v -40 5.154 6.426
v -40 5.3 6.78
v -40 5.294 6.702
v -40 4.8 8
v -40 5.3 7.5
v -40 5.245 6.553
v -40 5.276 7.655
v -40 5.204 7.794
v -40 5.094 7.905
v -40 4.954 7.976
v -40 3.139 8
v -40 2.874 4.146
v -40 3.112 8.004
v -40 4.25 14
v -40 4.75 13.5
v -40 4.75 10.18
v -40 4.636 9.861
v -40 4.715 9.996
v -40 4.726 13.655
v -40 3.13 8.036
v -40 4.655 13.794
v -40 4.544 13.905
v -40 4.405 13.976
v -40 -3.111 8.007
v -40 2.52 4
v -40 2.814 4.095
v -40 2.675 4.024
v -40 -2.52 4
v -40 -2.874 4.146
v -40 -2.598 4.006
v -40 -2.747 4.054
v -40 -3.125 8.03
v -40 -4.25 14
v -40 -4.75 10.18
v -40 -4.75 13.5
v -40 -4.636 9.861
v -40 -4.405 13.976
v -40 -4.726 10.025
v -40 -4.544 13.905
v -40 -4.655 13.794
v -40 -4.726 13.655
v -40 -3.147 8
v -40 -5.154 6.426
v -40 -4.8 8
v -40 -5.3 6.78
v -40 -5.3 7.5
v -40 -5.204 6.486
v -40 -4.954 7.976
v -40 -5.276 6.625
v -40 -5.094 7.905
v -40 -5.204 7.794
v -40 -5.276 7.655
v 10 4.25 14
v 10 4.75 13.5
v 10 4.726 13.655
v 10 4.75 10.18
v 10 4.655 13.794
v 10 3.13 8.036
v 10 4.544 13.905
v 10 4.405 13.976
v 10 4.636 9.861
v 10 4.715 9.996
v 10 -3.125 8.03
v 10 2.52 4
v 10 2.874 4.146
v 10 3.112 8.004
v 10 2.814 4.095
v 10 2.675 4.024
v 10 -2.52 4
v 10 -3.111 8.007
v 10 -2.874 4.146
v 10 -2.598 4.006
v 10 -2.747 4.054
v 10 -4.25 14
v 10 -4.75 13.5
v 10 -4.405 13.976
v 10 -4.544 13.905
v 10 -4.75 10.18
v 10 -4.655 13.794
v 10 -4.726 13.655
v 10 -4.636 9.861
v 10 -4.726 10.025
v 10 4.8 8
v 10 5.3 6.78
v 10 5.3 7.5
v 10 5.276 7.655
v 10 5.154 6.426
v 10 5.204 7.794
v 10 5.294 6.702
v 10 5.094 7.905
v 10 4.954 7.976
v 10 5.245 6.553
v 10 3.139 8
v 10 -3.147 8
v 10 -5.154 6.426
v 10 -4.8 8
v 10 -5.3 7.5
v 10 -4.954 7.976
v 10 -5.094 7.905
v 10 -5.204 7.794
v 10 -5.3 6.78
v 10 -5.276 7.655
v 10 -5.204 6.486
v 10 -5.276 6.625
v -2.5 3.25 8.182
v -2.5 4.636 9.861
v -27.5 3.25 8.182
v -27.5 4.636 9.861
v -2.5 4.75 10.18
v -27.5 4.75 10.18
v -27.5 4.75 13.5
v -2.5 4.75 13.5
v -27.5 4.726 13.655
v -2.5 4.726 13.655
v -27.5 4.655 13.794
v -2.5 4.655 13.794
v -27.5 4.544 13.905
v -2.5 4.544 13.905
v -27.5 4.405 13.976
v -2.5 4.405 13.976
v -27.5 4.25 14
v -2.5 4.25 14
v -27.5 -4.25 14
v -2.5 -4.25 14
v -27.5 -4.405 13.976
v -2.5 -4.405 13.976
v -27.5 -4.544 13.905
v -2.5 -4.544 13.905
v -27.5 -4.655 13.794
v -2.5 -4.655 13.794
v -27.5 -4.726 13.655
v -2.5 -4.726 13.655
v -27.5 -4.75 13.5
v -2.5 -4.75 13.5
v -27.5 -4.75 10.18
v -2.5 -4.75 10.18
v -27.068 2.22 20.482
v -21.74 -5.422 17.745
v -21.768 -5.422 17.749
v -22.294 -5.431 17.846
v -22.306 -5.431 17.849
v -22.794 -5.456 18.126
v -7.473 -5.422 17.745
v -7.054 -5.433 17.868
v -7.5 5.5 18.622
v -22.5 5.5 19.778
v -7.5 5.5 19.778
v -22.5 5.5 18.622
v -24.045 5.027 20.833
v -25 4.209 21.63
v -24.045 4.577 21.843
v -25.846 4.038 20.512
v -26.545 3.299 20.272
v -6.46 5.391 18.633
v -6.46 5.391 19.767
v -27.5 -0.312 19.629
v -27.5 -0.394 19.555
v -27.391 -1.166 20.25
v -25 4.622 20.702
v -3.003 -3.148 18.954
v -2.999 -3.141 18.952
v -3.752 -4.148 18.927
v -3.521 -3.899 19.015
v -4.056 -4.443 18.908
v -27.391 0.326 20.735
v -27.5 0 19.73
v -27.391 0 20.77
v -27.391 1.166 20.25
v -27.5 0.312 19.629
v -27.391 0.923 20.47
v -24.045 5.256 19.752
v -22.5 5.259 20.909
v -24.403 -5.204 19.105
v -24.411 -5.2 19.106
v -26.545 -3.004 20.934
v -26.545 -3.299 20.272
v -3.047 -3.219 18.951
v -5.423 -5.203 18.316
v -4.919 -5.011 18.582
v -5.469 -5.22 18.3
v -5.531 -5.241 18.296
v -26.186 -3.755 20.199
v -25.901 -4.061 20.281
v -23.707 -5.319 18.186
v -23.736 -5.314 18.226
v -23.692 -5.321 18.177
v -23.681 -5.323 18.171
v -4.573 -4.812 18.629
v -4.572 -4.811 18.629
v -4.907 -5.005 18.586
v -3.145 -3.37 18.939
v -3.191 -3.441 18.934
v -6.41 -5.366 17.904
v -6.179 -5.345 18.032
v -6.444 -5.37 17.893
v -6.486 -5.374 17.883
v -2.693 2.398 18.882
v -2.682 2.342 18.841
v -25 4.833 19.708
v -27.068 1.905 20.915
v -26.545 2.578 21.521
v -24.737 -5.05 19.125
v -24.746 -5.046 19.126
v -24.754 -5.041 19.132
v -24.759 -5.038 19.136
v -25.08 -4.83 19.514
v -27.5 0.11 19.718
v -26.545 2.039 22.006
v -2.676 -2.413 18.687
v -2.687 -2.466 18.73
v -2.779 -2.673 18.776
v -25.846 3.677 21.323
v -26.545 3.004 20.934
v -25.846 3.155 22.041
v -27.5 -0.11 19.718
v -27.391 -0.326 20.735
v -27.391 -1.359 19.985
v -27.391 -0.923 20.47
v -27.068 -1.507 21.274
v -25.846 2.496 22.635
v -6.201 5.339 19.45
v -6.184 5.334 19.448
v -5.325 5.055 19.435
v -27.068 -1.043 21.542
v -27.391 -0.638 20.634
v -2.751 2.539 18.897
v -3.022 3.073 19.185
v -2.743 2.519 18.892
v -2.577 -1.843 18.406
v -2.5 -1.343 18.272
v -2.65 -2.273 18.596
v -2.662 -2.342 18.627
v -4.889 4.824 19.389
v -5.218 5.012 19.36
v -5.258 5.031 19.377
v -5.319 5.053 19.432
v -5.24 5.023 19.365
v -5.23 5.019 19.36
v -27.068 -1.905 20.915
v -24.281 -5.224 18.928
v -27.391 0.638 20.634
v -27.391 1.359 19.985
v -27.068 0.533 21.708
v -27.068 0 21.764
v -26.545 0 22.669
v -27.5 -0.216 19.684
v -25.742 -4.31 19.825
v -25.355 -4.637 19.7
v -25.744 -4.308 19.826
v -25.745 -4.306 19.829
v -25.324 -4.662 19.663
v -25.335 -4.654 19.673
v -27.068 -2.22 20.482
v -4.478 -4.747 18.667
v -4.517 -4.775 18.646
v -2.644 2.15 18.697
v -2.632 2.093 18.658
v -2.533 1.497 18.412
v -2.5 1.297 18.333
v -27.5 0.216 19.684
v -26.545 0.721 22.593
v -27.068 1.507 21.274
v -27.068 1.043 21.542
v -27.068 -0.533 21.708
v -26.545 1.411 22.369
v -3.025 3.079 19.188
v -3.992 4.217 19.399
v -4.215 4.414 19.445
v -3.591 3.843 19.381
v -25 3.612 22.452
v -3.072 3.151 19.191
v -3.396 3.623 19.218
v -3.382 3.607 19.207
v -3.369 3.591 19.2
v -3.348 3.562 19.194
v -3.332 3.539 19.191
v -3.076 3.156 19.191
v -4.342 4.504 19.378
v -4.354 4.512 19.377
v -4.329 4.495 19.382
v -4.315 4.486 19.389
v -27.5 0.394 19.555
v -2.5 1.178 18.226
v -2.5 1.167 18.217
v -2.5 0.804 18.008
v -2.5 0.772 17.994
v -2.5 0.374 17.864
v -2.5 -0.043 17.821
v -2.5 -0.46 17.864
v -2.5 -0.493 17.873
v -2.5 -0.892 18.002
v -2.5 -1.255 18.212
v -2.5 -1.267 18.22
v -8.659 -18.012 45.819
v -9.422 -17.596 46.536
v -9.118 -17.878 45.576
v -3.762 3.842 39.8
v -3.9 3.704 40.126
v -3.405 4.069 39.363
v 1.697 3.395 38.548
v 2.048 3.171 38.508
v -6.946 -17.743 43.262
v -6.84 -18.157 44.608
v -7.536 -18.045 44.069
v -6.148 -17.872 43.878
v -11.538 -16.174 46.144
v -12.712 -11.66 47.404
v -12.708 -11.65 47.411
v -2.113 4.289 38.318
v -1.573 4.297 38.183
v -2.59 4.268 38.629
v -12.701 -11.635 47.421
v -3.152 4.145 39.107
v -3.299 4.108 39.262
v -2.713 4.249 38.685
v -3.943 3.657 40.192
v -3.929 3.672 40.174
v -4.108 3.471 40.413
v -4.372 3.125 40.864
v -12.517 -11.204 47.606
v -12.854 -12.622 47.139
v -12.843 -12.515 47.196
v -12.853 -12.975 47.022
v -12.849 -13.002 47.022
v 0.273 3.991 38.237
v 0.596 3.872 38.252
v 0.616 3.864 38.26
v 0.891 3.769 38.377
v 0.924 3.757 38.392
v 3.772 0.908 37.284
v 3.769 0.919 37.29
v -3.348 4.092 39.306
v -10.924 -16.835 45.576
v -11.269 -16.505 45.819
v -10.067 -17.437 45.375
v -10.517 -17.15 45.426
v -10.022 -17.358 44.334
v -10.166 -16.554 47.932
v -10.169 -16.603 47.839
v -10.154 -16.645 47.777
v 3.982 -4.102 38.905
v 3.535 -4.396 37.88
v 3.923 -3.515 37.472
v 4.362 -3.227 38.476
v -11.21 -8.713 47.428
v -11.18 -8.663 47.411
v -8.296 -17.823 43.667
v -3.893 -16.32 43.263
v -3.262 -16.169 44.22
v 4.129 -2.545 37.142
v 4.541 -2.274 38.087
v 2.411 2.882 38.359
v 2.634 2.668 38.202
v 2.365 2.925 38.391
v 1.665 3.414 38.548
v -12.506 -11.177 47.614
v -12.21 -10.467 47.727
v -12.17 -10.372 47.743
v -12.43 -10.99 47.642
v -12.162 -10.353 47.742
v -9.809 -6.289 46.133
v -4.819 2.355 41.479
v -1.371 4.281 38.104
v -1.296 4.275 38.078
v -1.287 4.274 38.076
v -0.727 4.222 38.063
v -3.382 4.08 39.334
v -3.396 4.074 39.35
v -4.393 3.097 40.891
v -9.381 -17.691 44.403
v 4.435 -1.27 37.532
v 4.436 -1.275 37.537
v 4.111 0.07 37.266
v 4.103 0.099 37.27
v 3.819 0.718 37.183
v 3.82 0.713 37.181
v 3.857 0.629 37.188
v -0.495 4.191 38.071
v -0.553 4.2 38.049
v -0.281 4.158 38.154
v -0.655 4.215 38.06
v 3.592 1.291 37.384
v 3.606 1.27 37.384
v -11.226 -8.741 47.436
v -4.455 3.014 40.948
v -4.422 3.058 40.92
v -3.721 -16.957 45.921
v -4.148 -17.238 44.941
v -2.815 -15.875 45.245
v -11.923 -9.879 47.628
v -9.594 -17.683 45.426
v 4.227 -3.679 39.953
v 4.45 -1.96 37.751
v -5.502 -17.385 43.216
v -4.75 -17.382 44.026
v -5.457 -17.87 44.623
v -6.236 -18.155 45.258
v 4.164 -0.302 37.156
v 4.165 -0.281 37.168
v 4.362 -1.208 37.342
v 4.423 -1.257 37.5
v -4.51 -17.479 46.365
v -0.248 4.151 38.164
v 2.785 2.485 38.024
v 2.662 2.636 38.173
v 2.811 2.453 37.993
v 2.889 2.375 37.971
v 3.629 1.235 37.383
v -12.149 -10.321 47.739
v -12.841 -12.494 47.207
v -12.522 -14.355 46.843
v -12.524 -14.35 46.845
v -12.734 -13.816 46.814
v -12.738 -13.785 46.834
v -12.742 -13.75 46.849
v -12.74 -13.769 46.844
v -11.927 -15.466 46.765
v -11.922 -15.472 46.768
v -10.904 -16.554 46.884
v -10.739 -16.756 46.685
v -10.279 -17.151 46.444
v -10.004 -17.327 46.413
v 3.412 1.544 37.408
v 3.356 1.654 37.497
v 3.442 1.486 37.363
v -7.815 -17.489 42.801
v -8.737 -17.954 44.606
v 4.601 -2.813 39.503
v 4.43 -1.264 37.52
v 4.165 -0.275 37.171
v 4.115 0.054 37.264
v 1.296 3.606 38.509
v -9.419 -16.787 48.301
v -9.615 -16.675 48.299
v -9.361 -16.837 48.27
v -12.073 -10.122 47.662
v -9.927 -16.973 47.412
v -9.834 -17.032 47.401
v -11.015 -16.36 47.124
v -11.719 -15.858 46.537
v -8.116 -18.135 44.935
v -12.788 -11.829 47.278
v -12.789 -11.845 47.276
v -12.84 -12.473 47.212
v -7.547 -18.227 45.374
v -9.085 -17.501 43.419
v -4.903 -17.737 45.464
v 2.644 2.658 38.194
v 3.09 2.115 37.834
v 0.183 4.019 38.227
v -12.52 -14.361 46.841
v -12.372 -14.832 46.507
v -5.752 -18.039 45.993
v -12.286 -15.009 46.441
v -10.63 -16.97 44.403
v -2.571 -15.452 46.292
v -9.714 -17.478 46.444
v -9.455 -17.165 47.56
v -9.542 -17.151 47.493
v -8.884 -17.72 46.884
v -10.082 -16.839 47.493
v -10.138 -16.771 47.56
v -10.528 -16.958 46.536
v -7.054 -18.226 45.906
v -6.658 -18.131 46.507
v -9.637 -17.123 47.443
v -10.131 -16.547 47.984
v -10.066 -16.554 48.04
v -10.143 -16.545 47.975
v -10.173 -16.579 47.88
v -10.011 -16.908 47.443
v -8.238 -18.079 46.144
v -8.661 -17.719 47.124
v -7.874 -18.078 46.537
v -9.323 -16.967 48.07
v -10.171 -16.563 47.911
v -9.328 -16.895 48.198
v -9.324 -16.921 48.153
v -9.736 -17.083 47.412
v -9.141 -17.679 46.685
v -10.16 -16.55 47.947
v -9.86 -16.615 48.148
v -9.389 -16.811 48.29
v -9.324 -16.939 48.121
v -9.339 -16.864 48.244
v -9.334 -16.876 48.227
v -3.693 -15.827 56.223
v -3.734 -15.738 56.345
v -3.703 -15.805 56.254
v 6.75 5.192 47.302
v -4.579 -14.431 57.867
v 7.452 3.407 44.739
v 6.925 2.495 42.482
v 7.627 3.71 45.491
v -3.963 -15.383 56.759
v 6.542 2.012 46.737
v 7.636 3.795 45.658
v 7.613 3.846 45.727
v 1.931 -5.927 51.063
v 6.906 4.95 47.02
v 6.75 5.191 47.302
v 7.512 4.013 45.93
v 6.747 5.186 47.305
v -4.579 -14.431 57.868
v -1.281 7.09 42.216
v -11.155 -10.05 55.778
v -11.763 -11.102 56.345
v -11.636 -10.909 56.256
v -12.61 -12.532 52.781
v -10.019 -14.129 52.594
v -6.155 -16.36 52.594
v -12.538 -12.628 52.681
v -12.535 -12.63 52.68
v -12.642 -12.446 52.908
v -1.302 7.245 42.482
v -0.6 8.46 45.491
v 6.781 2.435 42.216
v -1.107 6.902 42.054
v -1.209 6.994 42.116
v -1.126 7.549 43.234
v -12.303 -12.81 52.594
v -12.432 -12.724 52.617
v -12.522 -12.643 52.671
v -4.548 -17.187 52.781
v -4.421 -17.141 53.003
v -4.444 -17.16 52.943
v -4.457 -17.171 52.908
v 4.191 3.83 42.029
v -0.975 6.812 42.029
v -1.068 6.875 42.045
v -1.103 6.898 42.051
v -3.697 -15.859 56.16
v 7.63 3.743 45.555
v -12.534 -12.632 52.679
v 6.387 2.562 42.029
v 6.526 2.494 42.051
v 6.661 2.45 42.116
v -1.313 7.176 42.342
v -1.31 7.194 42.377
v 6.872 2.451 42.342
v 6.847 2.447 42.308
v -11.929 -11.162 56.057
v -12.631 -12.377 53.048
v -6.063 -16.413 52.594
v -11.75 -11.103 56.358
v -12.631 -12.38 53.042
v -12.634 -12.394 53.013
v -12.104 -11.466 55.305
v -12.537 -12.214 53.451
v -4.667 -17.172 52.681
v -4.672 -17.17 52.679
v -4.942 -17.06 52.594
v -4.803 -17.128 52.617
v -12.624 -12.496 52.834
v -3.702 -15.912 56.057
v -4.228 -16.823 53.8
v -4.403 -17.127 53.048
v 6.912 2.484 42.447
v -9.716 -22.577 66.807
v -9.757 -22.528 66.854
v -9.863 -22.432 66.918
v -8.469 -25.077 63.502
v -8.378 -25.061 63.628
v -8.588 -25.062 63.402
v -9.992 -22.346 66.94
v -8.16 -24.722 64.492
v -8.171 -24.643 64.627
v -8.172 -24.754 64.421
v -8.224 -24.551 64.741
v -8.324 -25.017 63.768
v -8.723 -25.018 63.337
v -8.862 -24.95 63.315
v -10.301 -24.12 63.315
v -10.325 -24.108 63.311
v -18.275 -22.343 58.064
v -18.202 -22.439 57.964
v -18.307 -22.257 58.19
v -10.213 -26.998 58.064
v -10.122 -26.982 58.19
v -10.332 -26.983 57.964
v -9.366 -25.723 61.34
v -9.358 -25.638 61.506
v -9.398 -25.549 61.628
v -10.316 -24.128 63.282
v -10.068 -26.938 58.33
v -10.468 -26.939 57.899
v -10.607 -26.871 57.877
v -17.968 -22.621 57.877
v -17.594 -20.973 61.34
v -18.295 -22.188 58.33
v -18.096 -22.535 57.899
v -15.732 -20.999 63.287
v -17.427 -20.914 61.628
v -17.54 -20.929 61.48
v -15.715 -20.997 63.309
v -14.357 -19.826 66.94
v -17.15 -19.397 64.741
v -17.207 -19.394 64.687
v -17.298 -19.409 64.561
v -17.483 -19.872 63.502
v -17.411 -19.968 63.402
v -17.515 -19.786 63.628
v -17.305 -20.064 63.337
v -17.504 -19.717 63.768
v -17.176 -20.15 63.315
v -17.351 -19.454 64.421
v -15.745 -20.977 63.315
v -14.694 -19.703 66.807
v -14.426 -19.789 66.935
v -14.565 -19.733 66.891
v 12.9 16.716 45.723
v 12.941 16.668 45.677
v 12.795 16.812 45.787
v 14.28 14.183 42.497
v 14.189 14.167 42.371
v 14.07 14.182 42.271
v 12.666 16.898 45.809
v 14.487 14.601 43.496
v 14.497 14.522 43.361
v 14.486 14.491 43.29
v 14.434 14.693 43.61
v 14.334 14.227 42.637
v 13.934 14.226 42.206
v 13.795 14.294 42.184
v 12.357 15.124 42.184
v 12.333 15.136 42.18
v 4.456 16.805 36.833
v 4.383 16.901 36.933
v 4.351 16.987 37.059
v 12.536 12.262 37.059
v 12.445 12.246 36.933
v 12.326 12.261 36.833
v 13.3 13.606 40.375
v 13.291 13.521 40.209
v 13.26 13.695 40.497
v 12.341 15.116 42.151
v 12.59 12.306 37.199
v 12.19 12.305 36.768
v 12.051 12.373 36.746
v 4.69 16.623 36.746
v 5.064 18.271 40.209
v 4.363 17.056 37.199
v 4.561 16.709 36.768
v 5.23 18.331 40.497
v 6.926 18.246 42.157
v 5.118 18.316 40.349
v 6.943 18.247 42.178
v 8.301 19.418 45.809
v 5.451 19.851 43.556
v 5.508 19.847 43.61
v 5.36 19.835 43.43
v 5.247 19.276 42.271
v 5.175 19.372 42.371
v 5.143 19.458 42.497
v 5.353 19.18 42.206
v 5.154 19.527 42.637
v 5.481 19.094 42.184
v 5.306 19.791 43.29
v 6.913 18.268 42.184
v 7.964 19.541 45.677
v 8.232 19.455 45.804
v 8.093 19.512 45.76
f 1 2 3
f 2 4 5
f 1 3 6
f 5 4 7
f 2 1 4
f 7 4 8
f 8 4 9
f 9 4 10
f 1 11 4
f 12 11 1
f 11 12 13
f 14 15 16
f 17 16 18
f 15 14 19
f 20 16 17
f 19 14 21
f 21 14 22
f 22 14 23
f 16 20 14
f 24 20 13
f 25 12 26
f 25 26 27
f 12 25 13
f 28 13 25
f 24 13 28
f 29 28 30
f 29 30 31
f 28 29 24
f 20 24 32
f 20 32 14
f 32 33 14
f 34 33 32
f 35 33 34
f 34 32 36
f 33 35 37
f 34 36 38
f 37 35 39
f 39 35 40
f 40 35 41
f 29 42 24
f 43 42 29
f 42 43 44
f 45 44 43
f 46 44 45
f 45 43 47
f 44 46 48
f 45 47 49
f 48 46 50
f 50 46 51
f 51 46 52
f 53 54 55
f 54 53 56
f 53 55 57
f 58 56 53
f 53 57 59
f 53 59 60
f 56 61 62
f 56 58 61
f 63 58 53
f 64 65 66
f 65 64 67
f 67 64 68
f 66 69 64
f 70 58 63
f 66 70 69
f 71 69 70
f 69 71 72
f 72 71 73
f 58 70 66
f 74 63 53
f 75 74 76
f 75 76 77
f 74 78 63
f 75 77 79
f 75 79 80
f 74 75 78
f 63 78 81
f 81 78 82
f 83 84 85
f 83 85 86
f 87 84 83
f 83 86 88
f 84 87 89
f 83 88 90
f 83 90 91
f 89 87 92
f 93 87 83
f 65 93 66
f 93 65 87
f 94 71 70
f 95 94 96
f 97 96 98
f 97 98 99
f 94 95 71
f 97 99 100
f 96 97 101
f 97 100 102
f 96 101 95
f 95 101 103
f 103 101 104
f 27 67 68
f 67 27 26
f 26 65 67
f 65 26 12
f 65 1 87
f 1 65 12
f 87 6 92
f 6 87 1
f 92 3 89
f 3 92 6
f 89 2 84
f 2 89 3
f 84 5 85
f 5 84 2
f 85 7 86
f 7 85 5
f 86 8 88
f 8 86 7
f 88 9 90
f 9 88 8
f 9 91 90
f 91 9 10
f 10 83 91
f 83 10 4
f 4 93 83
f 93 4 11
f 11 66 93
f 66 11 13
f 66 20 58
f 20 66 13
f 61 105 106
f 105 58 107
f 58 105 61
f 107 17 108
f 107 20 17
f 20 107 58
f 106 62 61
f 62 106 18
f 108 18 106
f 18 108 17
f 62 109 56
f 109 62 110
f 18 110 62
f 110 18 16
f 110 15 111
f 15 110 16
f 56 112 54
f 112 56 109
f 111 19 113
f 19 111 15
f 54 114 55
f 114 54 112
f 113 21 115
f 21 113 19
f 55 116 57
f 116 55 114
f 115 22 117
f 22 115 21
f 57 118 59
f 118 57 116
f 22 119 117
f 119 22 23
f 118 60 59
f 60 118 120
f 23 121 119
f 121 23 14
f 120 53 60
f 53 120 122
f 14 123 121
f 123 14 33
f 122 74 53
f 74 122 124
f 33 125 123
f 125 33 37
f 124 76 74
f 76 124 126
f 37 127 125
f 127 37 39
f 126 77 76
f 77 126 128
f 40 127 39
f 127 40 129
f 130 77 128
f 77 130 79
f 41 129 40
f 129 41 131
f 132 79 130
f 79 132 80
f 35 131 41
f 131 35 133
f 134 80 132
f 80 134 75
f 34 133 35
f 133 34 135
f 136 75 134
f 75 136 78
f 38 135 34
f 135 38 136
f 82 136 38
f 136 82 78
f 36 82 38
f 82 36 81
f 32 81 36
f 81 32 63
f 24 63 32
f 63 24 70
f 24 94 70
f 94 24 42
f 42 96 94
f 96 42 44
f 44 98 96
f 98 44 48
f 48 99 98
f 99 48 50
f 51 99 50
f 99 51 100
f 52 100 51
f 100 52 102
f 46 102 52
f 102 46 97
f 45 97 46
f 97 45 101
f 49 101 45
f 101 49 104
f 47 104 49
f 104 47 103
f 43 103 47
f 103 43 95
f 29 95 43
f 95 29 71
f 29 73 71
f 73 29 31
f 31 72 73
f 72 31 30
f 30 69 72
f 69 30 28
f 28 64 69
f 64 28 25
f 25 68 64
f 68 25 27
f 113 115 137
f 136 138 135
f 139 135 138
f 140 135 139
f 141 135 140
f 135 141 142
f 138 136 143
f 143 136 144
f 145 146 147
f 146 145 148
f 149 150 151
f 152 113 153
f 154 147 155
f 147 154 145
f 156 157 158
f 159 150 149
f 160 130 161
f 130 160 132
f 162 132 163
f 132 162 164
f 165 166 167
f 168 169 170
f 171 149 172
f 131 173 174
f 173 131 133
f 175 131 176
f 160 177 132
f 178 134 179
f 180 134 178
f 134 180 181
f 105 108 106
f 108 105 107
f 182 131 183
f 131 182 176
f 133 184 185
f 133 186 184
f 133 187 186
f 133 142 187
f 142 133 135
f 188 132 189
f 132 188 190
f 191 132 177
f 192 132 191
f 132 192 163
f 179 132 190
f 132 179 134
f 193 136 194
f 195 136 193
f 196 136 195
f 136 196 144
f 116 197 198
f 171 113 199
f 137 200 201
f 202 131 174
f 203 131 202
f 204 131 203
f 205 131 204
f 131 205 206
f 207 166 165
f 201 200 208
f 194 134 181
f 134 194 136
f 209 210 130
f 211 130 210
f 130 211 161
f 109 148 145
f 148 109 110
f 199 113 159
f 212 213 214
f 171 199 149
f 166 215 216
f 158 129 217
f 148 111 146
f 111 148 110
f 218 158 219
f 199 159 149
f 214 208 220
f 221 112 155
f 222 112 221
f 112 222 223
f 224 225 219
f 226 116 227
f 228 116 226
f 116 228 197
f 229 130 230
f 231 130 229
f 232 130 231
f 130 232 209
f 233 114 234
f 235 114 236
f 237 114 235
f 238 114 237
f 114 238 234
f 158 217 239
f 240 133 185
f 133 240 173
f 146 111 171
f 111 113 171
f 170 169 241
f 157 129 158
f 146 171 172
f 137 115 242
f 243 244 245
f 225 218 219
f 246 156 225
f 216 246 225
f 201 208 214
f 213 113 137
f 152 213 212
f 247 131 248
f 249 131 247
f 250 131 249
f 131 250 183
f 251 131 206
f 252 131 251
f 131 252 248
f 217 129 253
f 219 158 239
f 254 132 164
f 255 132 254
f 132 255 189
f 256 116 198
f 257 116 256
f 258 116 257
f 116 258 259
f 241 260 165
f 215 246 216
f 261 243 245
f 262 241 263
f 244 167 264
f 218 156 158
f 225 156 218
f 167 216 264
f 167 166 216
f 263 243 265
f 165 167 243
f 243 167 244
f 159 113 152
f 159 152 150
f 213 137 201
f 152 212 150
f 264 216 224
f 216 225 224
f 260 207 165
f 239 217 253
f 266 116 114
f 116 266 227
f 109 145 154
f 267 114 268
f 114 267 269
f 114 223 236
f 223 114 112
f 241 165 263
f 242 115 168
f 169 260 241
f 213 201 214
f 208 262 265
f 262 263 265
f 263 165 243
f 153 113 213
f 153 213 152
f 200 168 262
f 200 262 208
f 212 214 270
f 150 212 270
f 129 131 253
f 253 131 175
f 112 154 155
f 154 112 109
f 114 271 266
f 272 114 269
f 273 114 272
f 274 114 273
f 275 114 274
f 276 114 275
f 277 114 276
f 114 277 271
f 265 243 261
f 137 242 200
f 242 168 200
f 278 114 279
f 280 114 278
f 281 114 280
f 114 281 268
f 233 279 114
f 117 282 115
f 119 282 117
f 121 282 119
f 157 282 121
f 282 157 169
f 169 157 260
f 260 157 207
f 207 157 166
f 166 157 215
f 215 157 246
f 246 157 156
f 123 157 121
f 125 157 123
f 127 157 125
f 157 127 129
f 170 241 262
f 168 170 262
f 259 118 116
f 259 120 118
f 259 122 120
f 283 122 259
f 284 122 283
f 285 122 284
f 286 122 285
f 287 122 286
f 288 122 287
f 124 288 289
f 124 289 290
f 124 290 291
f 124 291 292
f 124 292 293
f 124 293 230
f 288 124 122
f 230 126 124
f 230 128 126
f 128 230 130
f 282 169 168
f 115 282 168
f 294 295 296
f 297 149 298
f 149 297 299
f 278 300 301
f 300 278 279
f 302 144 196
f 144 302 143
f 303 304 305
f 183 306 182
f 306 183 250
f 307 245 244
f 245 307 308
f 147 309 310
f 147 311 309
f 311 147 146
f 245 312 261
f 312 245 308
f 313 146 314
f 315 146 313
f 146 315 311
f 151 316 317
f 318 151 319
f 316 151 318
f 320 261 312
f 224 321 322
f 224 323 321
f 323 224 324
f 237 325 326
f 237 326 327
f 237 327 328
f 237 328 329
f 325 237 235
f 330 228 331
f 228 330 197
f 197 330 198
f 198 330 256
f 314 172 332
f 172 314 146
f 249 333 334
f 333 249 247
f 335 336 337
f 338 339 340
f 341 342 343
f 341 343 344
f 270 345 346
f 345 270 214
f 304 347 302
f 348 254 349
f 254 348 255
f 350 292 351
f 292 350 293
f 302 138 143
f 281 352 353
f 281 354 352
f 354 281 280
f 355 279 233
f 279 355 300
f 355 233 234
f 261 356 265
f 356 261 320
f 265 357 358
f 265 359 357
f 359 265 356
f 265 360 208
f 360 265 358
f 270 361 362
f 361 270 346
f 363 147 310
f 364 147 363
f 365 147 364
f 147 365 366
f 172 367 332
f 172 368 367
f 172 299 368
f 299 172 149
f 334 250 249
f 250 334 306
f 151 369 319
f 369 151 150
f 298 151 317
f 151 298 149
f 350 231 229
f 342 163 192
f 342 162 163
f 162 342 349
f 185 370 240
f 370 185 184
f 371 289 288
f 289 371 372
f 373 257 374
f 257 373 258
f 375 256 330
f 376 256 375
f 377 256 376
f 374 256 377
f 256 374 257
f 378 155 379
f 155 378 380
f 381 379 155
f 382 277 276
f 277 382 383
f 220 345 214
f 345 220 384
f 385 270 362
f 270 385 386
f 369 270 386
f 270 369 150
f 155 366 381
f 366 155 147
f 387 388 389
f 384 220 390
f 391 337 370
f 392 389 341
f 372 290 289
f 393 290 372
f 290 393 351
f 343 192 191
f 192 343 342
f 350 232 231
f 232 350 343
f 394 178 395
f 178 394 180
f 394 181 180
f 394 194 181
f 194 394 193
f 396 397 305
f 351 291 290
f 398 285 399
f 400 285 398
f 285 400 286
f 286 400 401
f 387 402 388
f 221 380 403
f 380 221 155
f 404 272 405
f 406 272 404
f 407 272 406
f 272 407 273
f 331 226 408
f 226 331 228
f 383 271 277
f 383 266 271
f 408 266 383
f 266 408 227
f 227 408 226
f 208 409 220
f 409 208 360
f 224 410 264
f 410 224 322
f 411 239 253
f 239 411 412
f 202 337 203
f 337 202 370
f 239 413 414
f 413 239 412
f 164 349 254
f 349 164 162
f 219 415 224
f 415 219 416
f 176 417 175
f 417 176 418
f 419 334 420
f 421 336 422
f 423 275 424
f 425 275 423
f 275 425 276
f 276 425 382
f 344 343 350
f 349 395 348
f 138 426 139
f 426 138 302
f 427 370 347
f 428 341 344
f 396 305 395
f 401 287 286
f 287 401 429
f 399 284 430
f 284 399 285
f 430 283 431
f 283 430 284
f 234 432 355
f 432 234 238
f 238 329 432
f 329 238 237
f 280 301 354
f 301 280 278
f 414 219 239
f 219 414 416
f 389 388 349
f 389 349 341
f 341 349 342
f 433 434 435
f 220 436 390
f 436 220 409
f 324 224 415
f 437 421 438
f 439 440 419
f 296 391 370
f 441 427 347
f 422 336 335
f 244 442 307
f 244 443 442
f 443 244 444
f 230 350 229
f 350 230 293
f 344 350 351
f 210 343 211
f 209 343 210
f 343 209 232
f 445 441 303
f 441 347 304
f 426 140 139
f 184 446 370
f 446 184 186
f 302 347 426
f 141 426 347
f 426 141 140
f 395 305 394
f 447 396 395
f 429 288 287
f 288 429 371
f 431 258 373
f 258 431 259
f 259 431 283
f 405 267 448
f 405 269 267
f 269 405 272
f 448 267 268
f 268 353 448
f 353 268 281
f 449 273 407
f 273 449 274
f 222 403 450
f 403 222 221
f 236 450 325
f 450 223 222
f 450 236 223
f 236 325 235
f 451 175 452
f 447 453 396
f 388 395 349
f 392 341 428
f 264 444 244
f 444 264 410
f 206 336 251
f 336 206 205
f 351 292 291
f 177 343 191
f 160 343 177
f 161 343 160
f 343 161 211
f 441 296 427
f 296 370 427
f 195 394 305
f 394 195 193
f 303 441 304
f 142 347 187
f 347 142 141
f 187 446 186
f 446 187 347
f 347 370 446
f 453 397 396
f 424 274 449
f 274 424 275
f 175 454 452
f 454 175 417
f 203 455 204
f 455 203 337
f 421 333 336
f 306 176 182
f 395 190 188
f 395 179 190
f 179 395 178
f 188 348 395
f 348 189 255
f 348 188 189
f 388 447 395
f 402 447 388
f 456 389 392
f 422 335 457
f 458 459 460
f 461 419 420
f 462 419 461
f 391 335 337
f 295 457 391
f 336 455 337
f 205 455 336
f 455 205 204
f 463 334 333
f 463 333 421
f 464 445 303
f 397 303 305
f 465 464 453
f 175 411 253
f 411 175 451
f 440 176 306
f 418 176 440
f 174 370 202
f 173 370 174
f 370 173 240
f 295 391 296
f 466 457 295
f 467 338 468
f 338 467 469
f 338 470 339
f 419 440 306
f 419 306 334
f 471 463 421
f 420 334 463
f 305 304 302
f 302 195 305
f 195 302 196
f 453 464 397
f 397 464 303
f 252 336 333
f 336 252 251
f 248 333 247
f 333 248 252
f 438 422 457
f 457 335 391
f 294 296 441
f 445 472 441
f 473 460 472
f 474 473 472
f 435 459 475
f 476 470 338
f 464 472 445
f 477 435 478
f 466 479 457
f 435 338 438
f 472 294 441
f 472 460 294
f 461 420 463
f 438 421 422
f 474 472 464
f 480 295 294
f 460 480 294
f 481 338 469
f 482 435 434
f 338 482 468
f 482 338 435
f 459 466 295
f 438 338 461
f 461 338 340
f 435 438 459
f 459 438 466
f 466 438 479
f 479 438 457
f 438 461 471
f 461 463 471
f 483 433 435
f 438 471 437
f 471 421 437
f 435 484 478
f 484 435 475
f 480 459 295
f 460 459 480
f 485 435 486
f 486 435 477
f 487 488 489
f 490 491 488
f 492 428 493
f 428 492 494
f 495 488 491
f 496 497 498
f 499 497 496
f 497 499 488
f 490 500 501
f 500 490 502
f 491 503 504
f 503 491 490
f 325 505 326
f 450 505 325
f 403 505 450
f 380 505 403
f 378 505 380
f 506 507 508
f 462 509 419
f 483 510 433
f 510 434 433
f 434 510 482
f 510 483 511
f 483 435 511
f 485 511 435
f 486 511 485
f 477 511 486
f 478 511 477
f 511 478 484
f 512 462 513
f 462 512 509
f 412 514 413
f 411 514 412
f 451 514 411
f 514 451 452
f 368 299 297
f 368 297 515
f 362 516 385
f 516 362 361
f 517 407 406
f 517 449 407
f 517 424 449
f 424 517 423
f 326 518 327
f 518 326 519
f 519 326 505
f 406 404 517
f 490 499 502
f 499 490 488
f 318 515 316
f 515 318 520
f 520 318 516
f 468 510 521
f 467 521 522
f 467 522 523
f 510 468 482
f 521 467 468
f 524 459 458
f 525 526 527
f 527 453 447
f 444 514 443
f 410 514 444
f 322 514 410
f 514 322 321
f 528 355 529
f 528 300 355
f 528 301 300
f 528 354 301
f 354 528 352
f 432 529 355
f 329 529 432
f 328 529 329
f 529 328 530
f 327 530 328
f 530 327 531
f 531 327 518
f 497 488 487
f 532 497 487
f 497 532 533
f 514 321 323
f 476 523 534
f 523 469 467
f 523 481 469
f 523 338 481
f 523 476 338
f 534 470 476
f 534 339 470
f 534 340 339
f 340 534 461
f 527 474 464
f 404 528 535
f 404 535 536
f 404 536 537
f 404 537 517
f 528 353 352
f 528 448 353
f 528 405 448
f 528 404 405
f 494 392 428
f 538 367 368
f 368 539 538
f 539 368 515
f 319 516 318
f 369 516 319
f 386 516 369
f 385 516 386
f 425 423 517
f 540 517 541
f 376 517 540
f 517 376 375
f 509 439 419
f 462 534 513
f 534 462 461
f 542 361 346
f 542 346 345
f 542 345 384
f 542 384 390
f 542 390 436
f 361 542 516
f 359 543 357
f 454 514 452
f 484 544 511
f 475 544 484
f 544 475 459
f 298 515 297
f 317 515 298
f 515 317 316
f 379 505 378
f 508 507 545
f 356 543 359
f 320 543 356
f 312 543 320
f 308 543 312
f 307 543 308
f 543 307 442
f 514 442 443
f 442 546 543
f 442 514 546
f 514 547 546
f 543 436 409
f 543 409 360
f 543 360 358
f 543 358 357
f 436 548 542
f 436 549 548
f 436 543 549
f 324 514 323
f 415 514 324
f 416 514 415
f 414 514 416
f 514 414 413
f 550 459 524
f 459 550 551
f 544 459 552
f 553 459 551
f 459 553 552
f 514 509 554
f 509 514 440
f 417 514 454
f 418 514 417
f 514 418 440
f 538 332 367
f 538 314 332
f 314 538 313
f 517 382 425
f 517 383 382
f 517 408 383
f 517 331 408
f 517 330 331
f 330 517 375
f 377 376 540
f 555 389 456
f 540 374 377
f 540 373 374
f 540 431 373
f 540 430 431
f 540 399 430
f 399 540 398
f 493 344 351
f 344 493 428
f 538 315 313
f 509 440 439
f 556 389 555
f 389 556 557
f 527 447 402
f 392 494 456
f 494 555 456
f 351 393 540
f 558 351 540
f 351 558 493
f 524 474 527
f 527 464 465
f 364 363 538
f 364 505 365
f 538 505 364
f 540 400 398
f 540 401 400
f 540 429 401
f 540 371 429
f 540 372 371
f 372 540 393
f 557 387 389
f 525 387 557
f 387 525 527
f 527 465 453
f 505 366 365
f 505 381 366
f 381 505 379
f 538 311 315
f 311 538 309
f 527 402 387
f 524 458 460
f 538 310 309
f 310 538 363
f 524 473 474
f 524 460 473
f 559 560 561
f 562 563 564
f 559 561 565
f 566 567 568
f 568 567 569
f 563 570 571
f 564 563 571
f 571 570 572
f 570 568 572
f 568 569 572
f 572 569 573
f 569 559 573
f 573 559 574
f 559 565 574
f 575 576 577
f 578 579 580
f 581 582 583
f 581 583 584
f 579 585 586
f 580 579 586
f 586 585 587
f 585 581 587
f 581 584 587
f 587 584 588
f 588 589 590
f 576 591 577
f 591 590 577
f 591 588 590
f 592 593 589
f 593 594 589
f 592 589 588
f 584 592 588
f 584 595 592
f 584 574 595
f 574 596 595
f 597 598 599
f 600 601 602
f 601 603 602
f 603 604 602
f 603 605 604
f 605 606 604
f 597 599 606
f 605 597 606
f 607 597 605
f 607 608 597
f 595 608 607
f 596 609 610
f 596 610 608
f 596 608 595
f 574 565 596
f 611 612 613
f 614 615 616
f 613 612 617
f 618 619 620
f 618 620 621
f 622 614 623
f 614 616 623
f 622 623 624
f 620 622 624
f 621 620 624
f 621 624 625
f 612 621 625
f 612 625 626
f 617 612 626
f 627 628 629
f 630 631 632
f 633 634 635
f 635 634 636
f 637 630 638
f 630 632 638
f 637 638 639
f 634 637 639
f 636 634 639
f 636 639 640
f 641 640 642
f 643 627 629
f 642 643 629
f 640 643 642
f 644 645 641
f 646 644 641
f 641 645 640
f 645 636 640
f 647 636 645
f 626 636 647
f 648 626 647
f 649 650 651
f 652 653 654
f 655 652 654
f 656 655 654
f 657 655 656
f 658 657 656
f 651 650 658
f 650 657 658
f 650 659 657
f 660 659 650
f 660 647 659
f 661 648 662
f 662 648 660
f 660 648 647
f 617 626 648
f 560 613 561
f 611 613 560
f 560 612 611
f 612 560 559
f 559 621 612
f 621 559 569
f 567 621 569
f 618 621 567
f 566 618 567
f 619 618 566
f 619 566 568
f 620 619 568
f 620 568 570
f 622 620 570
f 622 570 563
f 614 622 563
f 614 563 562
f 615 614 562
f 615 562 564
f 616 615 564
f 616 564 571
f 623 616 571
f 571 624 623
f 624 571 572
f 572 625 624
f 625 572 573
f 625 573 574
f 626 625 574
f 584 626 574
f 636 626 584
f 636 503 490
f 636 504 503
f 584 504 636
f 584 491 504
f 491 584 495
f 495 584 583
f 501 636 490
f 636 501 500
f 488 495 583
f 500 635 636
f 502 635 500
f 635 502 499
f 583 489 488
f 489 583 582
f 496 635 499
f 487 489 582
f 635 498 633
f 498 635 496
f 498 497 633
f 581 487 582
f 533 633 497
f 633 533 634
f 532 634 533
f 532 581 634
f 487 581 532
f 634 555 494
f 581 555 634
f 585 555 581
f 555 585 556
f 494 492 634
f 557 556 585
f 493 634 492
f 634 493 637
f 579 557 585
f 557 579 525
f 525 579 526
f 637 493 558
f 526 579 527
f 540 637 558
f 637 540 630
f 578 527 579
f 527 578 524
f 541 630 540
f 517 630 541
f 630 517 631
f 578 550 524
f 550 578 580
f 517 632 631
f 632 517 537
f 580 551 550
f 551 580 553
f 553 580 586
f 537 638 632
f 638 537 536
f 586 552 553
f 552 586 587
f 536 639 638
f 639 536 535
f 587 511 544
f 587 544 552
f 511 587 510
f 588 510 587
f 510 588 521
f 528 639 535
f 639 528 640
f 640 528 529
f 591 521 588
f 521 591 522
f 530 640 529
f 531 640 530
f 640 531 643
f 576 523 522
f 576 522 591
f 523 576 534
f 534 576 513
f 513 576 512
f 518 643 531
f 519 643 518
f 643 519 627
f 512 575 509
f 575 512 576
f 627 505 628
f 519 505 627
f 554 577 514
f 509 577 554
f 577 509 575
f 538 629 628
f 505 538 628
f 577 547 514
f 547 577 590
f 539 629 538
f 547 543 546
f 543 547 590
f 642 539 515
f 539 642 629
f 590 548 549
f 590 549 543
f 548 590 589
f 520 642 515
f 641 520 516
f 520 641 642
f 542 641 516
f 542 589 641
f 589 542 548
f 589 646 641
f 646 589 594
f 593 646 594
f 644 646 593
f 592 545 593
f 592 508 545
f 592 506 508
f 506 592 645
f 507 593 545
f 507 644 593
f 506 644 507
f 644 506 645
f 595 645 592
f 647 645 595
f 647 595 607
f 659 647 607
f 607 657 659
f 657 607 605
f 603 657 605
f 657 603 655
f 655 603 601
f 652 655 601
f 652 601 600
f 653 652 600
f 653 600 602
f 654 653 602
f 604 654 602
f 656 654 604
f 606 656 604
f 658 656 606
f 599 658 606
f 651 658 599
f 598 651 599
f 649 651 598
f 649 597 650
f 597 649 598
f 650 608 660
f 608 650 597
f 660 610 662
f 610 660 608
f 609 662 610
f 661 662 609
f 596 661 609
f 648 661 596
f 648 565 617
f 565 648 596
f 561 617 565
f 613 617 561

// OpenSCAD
/* [main] */
Distance=60;//
////sides
fn=30;//
/* [Top Rod(2)] */
Knuckle_Rotate=60;//
Knuckle_Pitch=25;//
Knuckle_Roll=0;//
 L2=50;//
Nut_R2=7;// 
Nut_H2=10;// 
//Fat_R2=10;//
//Fat_L2=10;//
Corner2=5;//
/* [Bottom Rod(1)] */
 L1=50;//
L1offset=-15;
Nut_R1=7;// 
Nut_H1=10;//
// 
////Corner Radius
Corner1=5;//
Knuckle_RotateB=0;//
Knuckle_PitchB=0;//
Knuckle_RollB=0;//
/* [Details] */
//
//
wristoffset1=0.96;//
wristoffset2=0.96;//
//
struttslimr1=0.79;//
struttsliml1=0.5;//
struttslimr2=0.79;//
struttsliml2=0.5;//
 

 
/* [Hidden] */
 
 
wrist1=Distance/3*wristoffset1;
wrist2=Distance/3*wristoffset2;
 {
 
RodJob(Knuckle_RotateB,Knuckle_PitchB,Knuckle_RollB);
}


module RodJob(Knuckle_Rotate1,Knuckle_Pitch1, Knuckle_Roll1){
difference(){
 color("lightblue")union(){
rotate([Knuckle_Roll1,Knuckle_Pitch1,Knuckle_Rotate1]) translate([L1offset,0,0]) rotate([0,90,0])   x20x20k(0,L1 );

hull(){
rotate([Knuckle_Roll1,Knuckle_Pitch1,Knuckle_Rotate1]) translate([L1offset,0,0]) rotate([0,90,0])   x20x20c(0,L1*struttsliml1  );

rotate([Knuckle_Roll1,Knuckle_Pitch1,Knuckle_Rotate1])translate([L1offset,0,wrist1]) rotate([0,90,0])     Rcylinder(Nut_R1*struttslimr1,L1*struttsliml1,Corner1,fn);

color("LemonChiffon") rotate([Knuckle_Roll1,Knuckle_Pitch1,Knuckle_Rotate1])translate([L1offset,0,wrist1]) rotate([0,90,0])     Rcylinder(Nut_R1*struttslimr1*0.5,L1*struttsliml1*0.5,0,fn);
}


hull(){ 
rotate([Knuckle_Roll1,Knuckle_Pitch1,Knuckle_Rotate1])translate([L1offset,0,wrist1]) rotate([0,90,0])     Rcylinder(Nut_R1*struttslimr1,L1*struttsliml1,Corner1,fn);

translate([0,0,Distance])rotate([Knuckle_Roll,Knuckle_Pitch,Knuckle_Rotate]) translate([0,0,-wrist2]) rotate([0,90,0]) Rcylinder(Nut_R2*struttslimr2,L2*struttsliml2,Corner2,fn);
}
color("LemonChiffon")hull(){ 
rotate([Knuckle_Roll1,Knuckle_Pitch1,Knuckle_Rotate1])translate([L1offset,0,wrist1]) rotate([0,90,0])  Rcylinder(Nut_R1*struttslimr1*0.5,L1*struttsliml1*0.5,0,fn);

translate([0,0,Distance])rotate([Knuckle_Roll,Knuckle_Pitch,Knuckle_Rotate]) translate([0,0,-wrist2]) rotate([0,90,0]) Rcylinder(Nut_R2*struttslimr2*0.5,L2*struttsliml2*+.5,0,fn);
}

hull(){
color("LemonChiffon")translate([0,0,Distance])rotate([Knuckle_Roll,Knuckle_Pitch,Knuckle_Rotate]) translate([0,0,-wrist2]) rotate([0,90,0]) Rcylinder(Nut_R2*struttslimr2*0.5,L2*struttsliml2*0.5,0,fn);

translate([0,0,Distance])rotate([Knuckle_Roll,Knuckle_Pitch,Knuckle_Rotate]) translate([0,0,-wrist2]) rotate([0,90,0]) Rcylinder(Nut_R2*struttslimr2,L2*struttsliml2,Corner2,fn);


translate([0,0,Distance])rotate([Knuckle_Roll,Knuckle_Pitch,Knuckle_Rotate]) translate([0,0,0]) rotate([0,90,0]) {x20x20c(180,L2*struttsliml2);
}

}
 
translate([0,0,Distance])rotate([Knuckle_Roll,Knuckle_Pitch,Knuckle_Rotate]) translate([0,0,0]) rotate([0,90,0]) {x20x20k(180,L2);
}

}

  

 


}





rotate([Knuckle_Roll1,Knuckle_Pitch1,Knuckle_Rotate1]) translate([L1offset,0,0])rotate([0,90,0]){%x20x20(L1*5 );} 


translate([0,0,Distance])rotate([Knuckle_Roll,Knuckle_Pitch,Knuckle_Rotate])   
rotate([0,90,0]){%x20x20(L2*5 );}

}

module x20x20 (l,r,r,f,c)
{
linear_extrude(l,center=true) union(){
rotate(0) profile20();
rotate(90)profile20();
rotate(180)profile20();
rotate(270) profile20();
}}
module x20x20k (a,l,r,r,f,c)
{
linear_extrude(l,center=true)  
rotate(90+a) profilekey();
 
}
module x20x20c (a,l,r,r,f,c)
{
linear_extrude(l,center=true)  
rotate(90+a) profileconnect();
 }
module profile20(){
	polygon(points = [[0, 0], [-9.56066, 9.56066], [-8.5, 10], [-4.75, 10], [-3.1, 8], [-5.3, 8], [-5.3, 6.57279], [-2.72721, 4], [0, 4], [0, 2.5], [0, 2.5], [0, 4], [2.72721, 4], [5.3, 6.57279], [5.3, 8], [3.1, 8], [4.75, 10], [8.5, 10], [9.56066, 9.56066]]);
}
module profilekey(){
offset(0.5,$fn=20)offset(-0.5)	polygon(points = [[-4.75, 14], [-4.75, 10], [-3.1, 8], [-5.3, 8], [-5.3, 6.57279], [-2.72721, 4], [0, 4], [0, 2.5], [0, 2.5], [0, 4], [2.72721, 4], [5.3, 6.57279], [5.3, 8], [3.1, 8], [4.75, 10], [4.75, 14]]);

}
module profileconnect(){
offset(0.5,$fn=20)offset(-0.5)		polygon(points = [[-4.75, 14], [-4.75, 10], [-3.1, 8],   [3.1, 8], [4.75, 10], [4.75, 14]]);

}
module Rcylinder(radius,lenght,rcorner,fn=32){
rotate_extrude(angle = 360, convexity = 4,$fn=fn) 
{
intersection(){
offset(r =rcorner)  {offset(r = -rcorner) {square([radius*2,lenght],center=true);}}
translate([max(lenght/2,radius),0,0])square([max(lenght,radius*2),max(lenght,radius*2)],center=true);
}
}
} 
 
